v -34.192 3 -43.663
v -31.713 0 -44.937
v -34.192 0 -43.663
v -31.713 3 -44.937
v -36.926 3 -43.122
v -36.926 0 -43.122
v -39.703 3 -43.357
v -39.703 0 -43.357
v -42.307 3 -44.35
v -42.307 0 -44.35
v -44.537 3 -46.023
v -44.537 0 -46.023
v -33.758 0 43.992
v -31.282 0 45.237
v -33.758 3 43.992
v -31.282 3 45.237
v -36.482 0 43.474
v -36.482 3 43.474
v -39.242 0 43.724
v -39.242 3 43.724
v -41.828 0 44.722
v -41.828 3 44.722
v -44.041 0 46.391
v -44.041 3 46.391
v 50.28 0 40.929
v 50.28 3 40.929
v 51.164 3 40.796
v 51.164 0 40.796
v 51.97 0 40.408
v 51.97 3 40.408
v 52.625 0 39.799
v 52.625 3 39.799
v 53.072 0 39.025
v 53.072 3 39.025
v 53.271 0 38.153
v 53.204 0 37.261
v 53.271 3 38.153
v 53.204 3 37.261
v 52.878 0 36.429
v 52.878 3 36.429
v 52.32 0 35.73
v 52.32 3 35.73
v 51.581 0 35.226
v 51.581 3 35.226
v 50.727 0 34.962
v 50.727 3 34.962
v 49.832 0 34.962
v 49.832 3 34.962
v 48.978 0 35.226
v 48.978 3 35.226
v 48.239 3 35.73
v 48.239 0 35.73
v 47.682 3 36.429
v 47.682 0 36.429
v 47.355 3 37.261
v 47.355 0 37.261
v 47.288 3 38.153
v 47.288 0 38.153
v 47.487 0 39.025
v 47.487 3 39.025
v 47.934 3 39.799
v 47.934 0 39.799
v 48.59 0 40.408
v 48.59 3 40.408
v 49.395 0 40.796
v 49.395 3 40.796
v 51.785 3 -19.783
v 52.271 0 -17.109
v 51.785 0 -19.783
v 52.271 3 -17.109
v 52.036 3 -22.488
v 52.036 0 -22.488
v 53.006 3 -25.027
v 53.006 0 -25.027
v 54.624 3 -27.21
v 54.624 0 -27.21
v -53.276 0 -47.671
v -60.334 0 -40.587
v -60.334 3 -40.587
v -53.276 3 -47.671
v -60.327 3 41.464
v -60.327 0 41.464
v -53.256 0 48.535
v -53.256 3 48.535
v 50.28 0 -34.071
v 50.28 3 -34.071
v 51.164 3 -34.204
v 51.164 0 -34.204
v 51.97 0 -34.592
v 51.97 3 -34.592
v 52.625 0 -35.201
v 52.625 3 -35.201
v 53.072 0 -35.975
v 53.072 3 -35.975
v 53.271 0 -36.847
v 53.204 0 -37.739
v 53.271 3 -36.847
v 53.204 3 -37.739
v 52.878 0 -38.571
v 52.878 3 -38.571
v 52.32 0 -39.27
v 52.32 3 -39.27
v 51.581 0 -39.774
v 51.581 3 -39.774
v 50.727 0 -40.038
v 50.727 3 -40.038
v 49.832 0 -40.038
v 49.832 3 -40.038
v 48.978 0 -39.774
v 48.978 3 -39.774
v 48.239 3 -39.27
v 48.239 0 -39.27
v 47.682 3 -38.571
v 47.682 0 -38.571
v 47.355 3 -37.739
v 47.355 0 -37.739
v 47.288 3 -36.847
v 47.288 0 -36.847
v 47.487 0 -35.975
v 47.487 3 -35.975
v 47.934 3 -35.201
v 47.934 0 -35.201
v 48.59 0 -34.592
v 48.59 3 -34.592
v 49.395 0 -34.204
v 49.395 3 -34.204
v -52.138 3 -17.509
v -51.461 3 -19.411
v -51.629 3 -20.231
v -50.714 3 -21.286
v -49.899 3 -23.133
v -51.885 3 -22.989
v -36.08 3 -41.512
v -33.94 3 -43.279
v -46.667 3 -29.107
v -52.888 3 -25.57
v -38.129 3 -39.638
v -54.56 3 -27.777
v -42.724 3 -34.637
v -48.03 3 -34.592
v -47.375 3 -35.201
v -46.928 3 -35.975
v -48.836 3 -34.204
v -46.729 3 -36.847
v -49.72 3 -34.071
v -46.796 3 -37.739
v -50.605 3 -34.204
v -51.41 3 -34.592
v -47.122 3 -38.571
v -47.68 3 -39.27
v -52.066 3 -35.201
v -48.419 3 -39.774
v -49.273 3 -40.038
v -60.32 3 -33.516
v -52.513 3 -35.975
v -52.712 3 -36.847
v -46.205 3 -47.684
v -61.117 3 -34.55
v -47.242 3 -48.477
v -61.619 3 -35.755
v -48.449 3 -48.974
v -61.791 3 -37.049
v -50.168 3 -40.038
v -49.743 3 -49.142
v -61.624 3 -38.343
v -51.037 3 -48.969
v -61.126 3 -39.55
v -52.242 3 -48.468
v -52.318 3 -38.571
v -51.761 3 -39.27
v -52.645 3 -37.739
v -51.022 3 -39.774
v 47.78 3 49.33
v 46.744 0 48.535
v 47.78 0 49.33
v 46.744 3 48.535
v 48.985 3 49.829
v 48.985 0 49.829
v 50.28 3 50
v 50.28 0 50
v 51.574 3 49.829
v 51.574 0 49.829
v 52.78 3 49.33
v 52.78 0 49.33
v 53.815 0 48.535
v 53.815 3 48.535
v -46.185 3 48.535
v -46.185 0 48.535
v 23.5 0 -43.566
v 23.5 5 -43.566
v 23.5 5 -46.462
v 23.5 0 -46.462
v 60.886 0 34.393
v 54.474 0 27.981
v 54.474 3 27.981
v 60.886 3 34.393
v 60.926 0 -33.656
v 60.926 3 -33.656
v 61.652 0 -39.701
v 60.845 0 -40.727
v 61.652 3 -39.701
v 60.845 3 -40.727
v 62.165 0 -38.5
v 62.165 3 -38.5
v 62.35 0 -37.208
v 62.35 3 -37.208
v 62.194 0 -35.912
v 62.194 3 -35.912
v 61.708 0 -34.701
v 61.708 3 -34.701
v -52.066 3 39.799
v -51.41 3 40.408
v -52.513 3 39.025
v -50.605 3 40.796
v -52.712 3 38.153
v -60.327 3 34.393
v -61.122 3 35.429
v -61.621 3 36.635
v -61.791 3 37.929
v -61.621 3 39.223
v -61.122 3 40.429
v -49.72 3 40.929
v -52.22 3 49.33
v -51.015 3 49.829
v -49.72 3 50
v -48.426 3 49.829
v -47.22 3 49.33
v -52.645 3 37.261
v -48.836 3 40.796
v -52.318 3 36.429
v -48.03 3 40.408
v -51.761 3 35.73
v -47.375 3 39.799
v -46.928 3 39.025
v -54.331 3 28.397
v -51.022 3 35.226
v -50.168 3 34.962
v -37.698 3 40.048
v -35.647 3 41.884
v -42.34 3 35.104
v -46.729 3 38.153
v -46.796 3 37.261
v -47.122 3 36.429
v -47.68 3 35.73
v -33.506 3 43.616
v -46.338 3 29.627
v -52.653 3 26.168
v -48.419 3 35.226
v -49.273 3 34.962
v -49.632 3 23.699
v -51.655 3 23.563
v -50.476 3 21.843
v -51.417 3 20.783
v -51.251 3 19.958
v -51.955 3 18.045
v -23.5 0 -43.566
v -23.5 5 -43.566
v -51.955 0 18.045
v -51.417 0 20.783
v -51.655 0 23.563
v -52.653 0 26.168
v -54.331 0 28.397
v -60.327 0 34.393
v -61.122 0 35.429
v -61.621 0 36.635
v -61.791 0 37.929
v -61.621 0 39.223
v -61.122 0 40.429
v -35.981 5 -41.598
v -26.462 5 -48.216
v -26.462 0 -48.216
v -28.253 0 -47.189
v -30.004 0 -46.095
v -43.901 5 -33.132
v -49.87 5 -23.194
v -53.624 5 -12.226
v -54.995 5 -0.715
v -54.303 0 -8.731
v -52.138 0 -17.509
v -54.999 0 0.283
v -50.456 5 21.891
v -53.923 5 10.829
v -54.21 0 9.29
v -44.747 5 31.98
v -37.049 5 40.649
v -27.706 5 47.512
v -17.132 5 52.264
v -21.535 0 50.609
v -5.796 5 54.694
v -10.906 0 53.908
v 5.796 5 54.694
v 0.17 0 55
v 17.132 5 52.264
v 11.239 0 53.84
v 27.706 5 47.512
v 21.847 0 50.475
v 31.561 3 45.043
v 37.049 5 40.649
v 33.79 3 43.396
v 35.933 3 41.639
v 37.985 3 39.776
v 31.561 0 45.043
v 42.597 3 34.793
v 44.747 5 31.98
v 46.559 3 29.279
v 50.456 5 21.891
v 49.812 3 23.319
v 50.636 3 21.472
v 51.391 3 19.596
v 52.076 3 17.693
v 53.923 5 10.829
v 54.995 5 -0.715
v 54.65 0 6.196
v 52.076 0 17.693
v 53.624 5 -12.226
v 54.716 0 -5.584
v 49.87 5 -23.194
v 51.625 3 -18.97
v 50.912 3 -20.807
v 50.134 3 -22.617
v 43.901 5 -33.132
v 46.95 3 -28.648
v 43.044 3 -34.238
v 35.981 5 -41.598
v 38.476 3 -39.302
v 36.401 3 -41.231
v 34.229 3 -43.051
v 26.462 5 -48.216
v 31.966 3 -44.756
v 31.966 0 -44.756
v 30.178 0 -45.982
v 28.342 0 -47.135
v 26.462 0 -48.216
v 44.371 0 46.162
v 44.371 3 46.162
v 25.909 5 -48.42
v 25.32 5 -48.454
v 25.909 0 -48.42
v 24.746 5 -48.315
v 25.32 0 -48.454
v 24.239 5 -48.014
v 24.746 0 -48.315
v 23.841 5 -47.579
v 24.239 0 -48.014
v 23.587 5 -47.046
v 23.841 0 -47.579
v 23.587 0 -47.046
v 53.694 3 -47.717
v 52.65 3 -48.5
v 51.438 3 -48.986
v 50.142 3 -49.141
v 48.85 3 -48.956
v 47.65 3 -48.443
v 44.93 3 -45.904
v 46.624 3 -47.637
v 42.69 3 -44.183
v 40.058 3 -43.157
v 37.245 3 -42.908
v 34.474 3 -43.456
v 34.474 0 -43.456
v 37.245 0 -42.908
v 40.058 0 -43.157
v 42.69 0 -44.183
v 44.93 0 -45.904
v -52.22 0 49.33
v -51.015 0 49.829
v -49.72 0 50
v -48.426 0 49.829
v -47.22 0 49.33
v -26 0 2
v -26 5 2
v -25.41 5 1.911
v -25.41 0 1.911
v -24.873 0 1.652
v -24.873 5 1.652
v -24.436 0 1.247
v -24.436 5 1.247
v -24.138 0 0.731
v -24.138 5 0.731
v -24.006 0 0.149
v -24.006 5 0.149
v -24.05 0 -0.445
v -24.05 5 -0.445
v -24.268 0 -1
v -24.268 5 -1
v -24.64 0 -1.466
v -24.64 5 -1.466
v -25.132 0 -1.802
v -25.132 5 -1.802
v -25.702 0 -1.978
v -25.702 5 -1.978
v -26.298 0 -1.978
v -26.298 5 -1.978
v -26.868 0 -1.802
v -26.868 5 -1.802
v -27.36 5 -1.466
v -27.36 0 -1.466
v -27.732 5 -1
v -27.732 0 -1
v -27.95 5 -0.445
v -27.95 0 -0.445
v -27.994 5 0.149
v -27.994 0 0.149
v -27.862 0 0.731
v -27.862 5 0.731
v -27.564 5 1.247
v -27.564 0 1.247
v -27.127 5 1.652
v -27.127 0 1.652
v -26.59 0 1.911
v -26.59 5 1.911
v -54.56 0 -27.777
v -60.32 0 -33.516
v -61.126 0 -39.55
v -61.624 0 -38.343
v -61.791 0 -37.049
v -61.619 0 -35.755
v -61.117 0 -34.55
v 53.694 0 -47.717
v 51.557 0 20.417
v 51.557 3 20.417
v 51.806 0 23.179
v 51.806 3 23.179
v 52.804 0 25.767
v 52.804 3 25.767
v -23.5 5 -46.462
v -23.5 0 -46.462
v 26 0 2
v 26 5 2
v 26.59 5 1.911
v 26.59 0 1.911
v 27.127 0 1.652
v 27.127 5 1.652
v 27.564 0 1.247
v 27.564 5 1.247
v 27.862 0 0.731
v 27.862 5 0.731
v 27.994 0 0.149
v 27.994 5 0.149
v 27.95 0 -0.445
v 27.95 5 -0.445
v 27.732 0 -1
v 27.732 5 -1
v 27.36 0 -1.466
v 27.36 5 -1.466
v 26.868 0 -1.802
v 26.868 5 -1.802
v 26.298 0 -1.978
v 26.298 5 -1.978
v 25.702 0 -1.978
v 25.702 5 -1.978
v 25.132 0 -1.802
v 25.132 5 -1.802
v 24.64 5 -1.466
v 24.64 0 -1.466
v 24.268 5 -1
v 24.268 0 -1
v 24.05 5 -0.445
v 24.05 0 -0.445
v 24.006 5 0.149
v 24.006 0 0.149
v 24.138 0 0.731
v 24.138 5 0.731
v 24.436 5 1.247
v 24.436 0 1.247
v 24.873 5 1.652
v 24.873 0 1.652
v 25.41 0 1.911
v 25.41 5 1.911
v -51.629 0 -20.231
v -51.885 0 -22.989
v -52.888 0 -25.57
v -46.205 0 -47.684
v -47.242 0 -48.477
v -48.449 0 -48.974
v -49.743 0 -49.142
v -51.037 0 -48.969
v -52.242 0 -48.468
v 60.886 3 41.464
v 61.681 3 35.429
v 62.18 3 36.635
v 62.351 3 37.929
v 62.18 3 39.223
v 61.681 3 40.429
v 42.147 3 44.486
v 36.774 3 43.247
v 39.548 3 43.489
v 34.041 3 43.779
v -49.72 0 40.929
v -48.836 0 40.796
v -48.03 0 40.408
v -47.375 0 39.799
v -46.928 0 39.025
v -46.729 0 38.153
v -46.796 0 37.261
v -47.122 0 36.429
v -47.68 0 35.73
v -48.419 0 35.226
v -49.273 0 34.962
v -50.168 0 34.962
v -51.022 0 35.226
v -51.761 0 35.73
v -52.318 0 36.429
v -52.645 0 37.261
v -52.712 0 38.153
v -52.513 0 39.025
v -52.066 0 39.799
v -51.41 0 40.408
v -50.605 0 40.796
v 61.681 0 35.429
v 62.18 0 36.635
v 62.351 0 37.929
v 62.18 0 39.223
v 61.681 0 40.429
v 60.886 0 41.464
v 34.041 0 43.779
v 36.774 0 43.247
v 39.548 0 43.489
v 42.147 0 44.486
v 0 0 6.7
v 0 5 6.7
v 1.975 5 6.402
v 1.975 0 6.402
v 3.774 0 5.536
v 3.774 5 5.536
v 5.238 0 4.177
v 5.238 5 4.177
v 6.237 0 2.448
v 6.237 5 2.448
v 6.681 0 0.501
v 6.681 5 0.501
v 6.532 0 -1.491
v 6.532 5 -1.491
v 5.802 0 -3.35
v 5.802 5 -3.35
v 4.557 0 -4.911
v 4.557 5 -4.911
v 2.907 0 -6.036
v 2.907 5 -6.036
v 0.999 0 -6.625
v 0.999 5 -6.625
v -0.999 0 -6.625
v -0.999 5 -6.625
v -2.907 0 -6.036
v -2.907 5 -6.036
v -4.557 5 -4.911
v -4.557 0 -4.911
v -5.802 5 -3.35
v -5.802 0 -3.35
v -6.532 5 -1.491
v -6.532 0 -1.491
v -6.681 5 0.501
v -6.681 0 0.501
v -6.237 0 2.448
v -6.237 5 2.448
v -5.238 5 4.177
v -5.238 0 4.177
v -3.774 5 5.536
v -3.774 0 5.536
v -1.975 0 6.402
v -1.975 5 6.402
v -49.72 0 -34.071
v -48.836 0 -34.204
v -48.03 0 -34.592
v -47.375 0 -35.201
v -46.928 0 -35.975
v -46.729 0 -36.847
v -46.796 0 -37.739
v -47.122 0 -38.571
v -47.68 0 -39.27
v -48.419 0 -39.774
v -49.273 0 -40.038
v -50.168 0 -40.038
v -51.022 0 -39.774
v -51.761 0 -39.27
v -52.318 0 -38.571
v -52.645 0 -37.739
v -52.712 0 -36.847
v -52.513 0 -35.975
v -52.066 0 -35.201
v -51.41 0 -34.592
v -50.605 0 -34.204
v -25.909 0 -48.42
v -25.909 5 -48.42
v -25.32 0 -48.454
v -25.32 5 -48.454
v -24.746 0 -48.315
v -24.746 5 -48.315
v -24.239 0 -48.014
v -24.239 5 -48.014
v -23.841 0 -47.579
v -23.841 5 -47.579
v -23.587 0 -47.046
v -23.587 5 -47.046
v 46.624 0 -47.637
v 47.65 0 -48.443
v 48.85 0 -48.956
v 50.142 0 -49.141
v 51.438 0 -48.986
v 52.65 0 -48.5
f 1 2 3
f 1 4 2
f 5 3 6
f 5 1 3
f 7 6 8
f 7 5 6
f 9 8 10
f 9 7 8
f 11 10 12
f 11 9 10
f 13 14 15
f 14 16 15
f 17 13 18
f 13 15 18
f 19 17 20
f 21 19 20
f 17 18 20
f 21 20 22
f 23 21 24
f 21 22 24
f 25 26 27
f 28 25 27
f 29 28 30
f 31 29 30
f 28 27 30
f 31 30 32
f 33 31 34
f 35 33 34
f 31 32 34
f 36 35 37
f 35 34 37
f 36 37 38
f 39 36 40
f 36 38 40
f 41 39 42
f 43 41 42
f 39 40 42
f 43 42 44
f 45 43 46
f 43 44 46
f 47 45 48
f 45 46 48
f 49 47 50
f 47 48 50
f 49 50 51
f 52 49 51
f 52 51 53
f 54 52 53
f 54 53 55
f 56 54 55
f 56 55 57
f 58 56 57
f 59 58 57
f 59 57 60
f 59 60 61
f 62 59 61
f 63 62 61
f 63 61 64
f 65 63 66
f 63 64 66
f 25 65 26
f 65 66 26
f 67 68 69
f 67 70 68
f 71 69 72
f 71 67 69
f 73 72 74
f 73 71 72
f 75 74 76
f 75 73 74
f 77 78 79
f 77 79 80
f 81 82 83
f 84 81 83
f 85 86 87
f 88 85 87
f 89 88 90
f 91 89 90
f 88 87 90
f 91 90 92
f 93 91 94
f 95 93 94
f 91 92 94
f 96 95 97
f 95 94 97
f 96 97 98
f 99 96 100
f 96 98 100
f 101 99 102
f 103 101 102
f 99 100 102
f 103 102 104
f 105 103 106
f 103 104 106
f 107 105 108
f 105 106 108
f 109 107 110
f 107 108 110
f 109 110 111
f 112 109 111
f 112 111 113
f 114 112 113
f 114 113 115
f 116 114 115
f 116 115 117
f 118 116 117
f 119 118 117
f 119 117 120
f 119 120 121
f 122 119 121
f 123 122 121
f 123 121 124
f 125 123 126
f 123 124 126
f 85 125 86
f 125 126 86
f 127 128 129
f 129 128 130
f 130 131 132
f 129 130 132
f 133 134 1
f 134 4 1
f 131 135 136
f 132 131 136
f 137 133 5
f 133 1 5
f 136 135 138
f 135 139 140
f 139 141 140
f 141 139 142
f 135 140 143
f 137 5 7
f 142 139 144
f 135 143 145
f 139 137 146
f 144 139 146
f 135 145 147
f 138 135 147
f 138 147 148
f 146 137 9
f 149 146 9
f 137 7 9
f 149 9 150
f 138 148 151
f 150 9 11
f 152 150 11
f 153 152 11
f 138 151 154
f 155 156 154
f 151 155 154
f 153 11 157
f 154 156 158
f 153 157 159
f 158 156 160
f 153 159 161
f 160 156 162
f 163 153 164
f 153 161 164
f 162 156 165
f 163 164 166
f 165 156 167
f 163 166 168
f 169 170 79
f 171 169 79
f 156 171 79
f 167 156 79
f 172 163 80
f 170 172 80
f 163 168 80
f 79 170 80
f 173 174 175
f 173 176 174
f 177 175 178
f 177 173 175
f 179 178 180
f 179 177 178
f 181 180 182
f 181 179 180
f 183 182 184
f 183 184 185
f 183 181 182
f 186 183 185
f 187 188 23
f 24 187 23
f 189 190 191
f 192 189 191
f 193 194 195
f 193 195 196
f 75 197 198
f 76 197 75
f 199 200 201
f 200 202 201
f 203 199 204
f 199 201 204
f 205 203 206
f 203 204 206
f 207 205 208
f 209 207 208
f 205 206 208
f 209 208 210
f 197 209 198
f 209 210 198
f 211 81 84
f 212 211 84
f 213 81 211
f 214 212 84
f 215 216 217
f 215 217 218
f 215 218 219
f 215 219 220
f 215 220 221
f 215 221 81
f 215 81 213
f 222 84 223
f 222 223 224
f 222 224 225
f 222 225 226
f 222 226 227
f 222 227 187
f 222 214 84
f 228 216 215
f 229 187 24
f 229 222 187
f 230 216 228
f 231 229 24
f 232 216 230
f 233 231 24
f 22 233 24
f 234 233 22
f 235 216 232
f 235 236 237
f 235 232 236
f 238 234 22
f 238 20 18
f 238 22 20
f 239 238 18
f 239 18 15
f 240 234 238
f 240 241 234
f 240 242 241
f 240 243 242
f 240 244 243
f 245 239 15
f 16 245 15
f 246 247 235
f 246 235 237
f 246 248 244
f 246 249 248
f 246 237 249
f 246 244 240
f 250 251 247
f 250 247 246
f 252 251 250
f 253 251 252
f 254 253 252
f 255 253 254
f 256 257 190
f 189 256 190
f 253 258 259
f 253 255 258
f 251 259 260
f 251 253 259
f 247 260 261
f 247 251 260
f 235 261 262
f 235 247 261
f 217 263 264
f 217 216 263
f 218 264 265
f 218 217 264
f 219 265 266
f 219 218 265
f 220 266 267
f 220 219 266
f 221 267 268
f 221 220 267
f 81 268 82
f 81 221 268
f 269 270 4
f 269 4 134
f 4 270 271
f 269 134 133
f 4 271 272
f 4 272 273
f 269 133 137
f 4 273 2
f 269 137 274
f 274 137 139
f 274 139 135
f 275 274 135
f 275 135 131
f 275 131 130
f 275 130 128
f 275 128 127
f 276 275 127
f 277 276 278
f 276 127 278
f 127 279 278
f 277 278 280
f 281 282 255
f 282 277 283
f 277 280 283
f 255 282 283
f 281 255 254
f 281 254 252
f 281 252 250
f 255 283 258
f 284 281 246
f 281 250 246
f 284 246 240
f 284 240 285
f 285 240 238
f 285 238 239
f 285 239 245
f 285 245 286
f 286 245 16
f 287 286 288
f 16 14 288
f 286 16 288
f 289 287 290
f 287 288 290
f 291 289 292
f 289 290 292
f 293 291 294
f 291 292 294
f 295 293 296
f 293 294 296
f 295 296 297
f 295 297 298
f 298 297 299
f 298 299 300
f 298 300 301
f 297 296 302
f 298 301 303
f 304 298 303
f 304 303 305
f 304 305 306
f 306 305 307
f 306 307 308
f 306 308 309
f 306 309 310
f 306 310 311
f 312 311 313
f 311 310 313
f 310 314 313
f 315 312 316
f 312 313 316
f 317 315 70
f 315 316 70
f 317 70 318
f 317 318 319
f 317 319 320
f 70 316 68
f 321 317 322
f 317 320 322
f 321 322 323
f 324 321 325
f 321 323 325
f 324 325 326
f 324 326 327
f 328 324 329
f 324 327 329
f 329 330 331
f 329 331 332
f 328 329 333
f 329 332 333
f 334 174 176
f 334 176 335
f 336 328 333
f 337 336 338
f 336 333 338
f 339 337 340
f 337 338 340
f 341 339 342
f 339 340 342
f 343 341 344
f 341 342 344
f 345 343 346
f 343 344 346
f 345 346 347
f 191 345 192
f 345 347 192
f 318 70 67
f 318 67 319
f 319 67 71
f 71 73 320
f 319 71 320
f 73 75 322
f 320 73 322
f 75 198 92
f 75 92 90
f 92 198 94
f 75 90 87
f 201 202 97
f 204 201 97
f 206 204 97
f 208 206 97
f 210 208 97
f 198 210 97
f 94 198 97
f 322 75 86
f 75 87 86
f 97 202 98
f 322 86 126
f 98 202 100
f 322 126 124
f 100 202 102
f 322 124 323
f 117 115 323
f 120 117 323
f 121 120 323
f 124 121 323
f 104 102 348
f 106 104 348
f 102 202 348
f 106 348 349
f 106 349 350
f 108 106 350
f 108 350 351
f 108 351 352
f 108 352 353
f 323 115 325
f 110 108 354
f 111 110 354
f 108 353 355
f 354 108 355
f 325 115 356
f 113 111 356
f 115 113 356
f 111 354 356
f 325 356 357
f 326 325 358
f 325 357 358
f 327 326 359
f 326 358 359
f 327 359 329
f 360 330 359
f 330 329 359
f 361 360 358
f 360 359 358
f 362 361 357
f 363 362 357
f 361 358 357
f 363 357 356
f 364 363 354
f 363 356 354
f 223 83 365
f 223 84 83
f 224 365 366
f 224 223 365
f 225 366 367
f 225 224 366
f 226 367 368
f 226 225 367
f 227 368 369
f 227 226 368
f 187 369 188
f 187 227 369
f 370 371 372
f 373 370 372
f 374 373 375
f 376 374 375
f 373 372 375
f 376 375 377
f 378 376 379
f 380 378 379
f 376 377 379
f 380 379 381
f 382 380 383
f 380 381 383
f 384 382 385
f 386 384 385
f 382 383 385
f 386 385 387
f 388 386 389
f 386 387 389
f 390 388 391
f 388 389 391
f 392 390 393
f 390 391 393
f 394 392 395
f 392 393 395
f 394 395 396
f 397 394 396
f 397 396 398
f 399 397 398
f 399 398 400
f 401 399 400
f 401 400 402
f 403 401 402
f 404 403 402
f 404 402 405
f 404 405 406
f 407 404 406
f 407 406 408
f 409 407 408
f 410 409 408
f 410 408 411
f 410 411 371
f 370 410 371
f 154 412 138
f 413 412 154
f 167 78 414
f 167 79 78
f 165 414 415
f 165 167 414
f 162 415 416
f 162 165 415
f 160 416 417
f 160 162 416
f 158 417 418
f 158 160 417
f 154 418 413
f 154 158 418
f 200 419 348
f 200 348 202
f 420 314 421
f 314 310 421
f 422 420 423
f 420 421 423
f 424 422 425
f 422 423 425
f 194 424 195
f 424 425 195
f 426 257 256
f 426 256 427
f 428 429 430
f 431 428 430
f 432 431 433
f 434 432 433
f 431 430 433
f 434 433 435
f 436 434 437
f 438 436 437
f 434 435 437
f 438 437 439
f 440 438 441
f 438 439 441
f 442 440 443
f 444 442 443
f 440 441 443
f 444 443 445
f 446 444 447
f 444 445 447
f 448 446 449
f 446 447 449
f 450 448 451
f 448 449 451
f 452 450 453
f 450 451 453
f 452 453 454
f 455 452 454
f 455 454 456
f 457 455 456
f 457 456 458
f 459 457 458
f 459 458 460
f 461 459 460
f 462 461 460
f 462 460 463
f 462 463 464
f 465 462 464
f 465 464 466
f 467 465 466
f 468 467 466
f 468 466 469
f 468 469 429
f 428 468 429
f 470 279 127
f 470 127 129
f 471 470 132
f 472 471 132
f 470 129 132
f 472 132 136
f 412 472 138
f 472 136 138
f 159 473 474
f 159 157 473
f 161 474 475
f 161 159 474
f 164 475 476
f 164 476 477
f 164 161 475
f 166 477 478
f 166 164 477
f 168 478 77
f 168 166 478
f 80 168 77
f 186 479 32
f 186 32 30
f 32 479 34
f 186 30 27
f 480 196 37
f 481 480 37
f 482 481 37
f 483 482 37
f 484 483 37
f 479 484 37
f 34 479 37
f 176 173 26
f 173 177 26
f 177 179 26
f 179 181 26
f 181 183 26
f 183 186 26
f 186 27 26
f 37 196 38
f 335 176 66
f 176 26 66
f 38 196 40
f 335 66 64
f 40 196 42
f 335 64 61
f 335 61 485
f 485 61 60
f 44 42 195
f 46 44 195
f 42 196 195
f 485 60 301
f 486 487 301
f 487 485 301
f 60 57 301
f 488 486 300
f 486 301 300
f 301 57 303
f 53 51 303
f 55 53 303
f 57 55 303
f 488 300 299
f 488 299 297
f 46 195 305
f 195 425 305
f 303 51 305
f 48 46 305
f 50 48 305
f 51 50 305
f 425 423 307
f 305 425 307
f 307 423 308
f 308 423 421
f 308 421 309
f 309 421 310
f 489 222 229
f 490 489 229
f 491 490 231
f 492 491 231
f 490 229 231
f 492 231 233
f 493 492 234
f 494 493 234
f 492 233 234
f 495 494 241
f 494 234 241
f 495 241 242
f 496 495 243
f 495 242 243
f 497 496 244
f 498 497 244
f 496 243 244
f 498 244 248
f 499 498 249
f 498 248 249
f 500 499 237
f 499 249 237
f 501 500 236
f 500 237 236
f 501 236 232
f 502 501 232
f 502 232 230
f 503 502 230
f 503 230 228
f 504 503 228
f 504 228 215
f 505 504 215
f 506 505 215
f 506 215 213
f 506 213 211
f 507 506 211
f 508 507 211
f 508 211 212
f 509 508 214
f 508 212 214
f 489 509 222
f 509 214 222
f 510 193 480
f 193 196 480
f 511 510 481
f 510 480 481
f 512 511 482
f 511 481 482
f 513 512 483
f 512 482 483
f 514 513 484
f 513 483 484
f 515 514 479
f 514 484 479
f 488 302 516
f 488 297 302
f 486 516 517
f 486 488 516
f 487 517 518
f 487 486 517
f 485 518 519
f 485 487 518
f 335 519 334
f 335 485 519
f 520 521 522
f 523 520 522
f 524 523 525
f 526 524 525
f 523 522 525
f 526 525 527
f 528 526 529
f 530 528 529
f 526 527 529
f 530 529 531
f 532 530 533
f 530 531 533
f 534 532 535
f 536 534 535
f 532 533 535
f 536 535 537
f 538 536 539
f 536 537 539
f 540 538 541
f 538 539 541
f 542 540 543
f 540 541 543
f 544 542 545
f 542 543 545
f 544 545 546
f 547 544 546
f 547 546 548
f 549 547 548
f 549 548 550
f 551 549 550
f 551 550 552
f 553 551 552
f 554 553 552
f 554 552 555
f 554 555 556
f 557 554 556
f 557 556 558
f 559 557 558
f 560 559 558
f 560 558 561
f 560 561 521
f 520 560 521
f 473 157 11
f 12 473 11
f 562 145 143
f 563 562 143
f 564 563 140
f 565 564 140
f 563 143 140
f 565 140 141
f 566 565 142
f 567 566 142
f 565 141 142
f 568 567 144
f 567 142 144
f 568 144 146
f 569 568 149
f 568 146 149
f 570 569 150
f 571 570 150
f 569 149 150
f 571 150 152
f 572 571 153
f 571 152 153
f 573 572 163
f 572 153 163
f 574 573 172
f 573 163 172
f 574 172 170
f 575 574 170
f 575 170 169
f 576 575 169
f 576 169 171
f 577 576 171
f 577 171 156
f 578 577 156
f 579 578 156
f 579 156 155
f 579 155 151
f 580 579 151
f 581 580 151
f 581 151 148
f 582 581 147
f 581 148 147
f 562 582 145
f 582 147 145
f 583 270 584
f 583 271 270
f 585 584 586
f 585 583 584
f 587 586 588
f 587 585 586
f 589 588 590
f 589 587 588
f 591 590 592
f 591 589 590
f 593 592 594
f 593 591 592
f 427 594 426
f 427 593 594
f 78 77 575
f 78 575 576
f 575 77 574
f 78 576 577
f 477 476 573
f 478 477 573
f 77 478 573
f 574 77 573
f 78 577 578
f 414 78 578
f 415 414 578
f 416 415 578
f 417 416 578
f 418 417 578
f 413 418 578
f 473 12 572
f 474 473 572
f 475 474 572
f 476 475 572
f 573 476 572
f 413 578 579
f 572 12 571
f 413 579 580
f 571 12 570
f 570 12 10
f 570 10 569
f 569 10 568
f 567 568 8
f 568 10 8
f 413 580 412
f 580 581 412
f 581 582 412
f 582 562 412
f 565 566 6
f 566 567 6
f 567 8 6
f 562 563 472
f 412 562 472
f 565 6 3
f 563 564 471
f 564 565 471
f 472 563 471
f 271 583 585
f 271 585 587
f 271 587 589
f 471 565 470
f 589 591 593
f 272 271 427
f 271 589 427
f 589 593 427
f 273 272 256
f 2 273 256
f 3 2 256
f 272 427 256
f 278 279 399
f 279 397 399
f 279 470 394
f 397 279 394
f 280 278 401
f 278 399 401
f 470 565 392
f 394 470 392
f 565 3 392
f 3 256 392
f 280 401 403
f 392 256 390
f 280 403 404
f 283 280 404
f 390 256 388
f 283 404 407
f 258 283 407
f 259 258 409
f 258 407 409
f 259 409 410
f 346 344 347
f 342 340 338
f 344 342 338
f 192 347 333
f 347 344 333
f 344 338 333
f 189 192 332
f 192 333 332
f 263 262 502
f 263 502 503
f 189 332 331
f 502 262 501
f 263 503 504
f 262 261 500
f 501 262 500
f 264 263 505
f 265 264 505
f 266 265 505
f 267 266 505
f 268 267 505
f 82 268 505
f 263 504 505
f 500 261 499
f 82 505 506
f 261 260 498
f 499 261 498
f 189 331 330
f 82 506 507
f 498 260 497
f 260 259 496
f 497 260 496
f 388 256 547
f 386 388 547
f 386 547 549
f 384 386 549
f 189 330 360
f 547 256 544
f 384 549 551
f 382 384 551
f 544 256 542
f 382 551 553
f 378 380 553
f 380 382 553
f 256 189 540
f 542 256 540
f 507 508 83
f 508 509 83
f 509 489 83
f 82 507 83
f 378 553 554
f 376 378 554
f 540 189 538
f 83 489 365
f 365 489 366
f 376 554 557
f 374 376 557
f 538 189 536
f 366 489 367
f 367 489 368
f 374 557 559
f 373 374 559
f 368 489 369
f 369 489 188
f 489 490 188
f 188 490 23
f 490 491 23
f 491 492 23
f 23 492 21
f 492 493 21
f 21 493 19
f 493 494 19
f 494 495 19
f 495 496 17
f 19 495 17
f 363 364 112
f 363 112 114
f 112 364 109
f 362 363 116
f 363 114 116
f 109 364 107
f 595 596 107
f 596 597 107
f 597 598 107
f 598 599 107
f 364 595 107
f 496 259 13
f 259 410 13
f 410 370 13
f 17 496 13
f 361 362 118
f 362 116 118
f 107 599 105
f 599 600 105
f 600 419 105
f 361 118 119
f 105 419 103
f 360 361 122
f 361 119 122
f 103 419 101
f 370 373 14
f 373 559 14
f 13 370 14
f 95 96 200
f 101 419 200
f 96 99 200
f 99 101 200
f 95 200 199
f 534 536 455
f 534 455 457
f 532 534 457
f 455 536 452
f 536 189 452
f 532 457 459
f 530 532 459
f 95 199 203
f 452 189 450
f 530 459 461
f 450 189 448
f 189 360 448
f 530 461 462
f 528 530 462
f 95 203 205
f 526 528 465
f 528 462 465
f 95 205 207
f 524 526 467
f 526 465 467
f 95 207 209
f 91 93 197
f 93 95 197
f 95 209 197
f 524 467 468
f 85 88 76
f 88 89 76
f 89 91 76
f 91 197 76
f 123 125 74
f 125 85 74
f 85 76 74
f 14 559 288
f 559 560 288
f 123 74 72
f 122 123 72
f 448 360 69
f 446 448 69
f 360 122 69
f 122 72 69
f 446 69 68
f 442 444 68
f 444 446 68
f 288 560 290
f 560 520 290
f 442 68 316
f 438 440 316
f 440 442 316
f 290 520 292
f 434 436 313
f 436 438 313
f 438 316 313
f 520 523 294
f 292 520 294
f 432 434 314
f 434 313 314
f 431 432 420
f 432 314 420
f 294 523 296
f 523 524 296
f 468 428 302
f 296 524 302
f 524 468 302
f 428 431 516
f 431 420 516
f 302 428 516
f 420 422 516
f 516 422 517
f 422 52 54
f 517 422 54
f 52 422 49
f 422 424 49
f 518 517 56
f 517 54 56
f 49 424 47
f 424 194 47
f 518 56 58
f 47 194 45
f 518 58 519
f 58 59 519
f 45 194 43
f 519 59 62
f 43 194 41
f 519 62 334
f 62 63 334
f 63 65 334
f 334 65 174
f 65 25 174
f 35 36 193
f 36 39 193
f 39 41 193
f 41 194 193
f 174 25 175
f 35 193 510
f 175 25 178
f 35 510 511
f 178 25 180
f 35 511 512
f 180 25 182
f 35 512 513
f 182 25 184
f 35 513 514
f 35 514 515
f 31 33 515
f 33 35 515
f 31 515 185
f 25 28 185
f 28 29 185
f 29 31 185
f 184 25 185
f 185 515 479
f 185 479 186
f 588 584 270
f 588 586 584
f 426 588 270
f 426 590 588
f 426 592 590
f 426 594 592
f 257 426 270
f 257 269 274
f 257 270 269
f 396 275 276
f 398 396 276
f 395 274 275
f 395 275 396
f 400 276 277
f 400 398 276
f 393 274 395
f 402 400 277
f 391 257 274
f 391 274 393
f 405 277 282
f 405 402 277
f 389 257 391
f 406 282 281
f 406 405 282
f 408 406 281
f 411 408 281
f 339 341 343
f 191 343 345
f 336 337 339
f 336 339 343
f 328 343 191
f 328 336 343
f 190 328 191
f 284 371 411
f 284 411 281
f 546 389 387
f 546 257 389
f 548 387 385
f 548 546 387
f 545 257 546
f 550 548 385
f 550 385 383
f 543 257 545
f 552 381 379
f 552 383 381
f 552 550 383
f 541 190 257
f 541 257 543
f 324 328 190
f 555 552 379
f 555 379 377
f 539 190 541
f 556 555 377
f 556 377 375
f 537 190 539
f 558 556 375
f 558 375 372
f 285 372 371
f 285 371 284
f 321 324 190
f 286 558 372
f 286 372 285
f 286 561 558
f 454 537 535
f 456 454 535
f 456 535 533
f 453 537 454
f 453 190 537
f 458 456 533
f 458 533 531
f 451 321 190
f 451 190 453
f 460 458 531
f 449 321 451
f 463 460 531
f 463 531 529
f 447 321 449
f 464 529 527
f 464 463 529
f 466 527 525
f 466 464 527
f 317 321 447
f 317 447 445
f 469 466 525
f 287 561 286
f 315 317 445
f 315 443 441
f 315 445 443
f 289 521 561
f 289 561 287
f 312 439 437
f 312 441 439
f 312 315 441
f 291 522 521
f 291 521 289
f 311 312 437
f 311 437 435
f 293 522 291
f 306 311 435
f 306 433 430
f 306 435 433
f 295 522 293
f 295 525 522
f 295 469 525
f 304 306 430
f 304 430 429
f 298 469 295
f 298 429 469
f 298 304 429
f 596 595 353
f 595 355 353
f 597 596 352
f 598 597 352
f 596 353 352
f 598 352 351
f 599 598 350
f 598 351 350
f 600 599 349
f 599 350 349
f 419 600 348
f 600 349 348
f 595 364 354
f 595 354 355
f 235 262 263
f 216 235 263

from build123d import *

# Parameters (mm, degrees)
SKETCH_1_R          = 55
EXTRUDE_1_DEPTH     = 5
SKETCH_5_W          = 47
SKETCH_5_H          = 12.24289715
CUT_EXTRUDE_2_DEPTH = 30
FILLET_4_R          = 2
FILLET_5_R          = 2
EXTRUDE_START       = -3
EXTRUDE_3_DEPTH     = 3
FILLET_7_R          = 10
FILLET_8_R          = 5
SKETCH_10_R         = 3
CUT_EXTRUDE_5_DEPTH = 3
SKETCH_15_R         = 6.7
CUT_EXTRUDE_6_DEPTH = 10
SKETCH_16_R         = 2
CUT_EXTRUDE_7_DEPTH = 10


with BuildPart() as part:
    # 草图1 → 凸台-拉伸1 (new body)
    with BuildSketch(Plane(origin=(0, 0, 0), x_dir=(1, 0, 0), z_dir=(0, 1, 0))):
        with Locations(Location((0, 0, 0), (0, 0, 270))):
            Circle(SKETCH_1_R)
    extrude(amount=EXTRUDE_1_DEPTH)

    # 草图5 → 切除-拉伸2 (cut)
    with BuildSketch(Plane(origin=(0, 5, 0), x_dir=(1, 0, 0), z_dir=(0, 1, 0))):
        with Locations((0, 49.687490397)):
            Rectangle(SKETCH_5_W, SKETCH_5_H)
    extrude(amount=-CUT_EXTRUDE_2_DEPTH, mode=Mode.SUBTRACT)

    # 圆角4
    fillet_4_edges = [part.edges().sort_by_distance(p)[0] for p in [
        (-23.5, 2.5, -49.726753363),
    ]]
    fillet(fillet_4_edges, radius=FILLET_4_R)

    # 圆角5
    fillet_5_edges = [part.edges().sort_by_distance(p)[0] for p in [
        (23.5, 2.5, -49.726753363),
    ]]
    fillet(fillet_5_edges, radius=FILLET_5_R)

    # 草图14 → 凸台-拉伸3 (add)
    with BuildSketch(Plane(origin=(0, 3, 0), x_dir=(1, 0, 0), z_dir=(0, 1, 0)).offset(EXTRUDE_START)):
        with BuildLine():
            Line((-49.898576095, 23.132922507), (-63.862525635, 37.044772973))
            Line((-63.862525635, 37.044772973), (-49.746845912, 51.213315099))
            Line((-49.746845912, 51.213315099), (-38.128637352, 39.638453724))
            ThreePointArc((-38.128637352, 39.638453724), (-44.78063998, 31.932652301), (-49.898576095, 23.132922507))
        make_face()
        with BuildLine():
            Line((49.811900188, -23.3189751), (64.421720913, -37.928795825))
            Line((64.421720913, -37.928795825), (50.279585289, -52.070931449))
            Line((50.279585289, -52.070931449), (37.984884655, -39.776230814))
            ThreePointArc((37.984884655, -39.776230814), (44.662950793, -32.097053236), (49.811900188, -23.3189751))
        make_face()
        with BuildLine():
            Line((-49.632393674, -23.698639164), (-63.862550335, -37.928795825))
            Line((-63.862550335, -37.928795825), (-49.720414711, -52.070931449))
            Line((-49.720414711, -52.070931449), (-37.697852746, -40.048369484))
            ThreePointArc((-37.697852746, -40.048369484), (-44.423770724, -32.427281642), (-49.632393674, -23.698639164))
        make_face()
        with BuildLine():
            Line((38.475737251, 39.301623923), (50.118901666, 51.212426922))
            Line((50.118901666, 51.212426922), (64.420808036, 37.231887798))
            Line((64.420808036, 37.231887798), (50.134465219, 22.6171483))
            ThreePointArc((50.134465219, 22.6171483), (45.083643676, 31.50341367), (38.475737251, 39.301623923))
        make_face()
    extrude(amount=EXTRUDE_3_DEPTH)

    # 圆角7
    fillet_7_edges = [part.edges().sort_by_distance(p)[0] for p in [
        (-38.128637352, 1.5, -39.638453724),
        (-49.898576095, 1.5, -23.132922507),
        (-49.632393674, 1.5, 23.698639164),
        (-37.697852746, 1.5, 40.048369484),
        (50.134465219, 1.5, -22.6171483),
        (38.475737251, 1.5, -39.301623923),
        (37.984884655, 1.5, 39.776230814),
        (49.811900188, 1.5, 23.3189751),
    ]]
    fillet(fillet_7_edges, radius=FILLET_7_R)

    # 圆角8
    fillet_8_edges = [part.edges().sort_by_distance(p)[0] for p in [
        (-63.862525635, 1.5, -37.044772973),
        (-49.746845912, 1.5, -51.213315099),
        (-49.720414711, 1.5, 52.070931449),
        (-63.862550335, 1.5, 37.928795825),
        (50.118901666, 1.5, -51.212426922),
        (64.420808036, 1.5, -37.231887798),
        (50.279585289, 1.5, 52.070931449),
        (64.421720913, 1.5, 37.928795825),
    ]]
    fillet(fillet_8_edges, radius=FILLET_8_R)

    # 草图10 → 切除-拉伸5 (cut)
    with BuildSketch(Plane(origin=(0, 3, 0), x_dir=(1, 0, 0), z_dir=(0, 1, 0))):
        with Locations(Location((-49.720414711, 37.071204175, 0), (0, 0, 270))):
            Circle(SKETCH_10_R)
        with Locations(Location((50.279585289, 37.071204175, 0), (0, 0, 270))):
            Circle(SKETCH_10_R)
        with Locations(Location((-49.720414711, -37.928795825, 0), (0, 0, 270))):
            Circle(SKETCH_10_R)
        with Locations(Location((50.279585289, -37.928795825, 0), (0, 0, 270))):
            Circle(SKETCH_10_R)
    extrude(amount=-CUT_EXTRUDE_5_DEPTH, mode=Mode.SUBTRACT)

    # 草图15 → 切除-拉伸6 (cut)
    with BuildSketch(Plane(origin=(0, 5, 0), x_dir=(1, 0, 0), z_dir=(0, 1, 0))):
        with Locations(Location((0, 0, 0), (0, 0, 270))):
            Circle(SKETCH_15_R)
    extrude(amount=-CUT_EXTRUDE_6_DEPTH, mode=Mode.SUBTRACT)

    # 草图16 → 切除-拉伸7 (cut)
    with BuildSketch(Plane(origin=(0, 5, 0), x_dir=(1, 0, 0), z_dir=(0, 1, 0))):
        with Locations(Location((-26, 0, 0), (0, 0, 270))):
            Circle(SKETCH_16_R)
        with Locations(Location((26, 0, 0), (0, 0, 270))):
            Circle(SKETCH_16_R)
    extrude(amount=-CUT_EXTRUDE_7_DEPTH, mode=Mode.SUBTRACT)


solid = part.part
